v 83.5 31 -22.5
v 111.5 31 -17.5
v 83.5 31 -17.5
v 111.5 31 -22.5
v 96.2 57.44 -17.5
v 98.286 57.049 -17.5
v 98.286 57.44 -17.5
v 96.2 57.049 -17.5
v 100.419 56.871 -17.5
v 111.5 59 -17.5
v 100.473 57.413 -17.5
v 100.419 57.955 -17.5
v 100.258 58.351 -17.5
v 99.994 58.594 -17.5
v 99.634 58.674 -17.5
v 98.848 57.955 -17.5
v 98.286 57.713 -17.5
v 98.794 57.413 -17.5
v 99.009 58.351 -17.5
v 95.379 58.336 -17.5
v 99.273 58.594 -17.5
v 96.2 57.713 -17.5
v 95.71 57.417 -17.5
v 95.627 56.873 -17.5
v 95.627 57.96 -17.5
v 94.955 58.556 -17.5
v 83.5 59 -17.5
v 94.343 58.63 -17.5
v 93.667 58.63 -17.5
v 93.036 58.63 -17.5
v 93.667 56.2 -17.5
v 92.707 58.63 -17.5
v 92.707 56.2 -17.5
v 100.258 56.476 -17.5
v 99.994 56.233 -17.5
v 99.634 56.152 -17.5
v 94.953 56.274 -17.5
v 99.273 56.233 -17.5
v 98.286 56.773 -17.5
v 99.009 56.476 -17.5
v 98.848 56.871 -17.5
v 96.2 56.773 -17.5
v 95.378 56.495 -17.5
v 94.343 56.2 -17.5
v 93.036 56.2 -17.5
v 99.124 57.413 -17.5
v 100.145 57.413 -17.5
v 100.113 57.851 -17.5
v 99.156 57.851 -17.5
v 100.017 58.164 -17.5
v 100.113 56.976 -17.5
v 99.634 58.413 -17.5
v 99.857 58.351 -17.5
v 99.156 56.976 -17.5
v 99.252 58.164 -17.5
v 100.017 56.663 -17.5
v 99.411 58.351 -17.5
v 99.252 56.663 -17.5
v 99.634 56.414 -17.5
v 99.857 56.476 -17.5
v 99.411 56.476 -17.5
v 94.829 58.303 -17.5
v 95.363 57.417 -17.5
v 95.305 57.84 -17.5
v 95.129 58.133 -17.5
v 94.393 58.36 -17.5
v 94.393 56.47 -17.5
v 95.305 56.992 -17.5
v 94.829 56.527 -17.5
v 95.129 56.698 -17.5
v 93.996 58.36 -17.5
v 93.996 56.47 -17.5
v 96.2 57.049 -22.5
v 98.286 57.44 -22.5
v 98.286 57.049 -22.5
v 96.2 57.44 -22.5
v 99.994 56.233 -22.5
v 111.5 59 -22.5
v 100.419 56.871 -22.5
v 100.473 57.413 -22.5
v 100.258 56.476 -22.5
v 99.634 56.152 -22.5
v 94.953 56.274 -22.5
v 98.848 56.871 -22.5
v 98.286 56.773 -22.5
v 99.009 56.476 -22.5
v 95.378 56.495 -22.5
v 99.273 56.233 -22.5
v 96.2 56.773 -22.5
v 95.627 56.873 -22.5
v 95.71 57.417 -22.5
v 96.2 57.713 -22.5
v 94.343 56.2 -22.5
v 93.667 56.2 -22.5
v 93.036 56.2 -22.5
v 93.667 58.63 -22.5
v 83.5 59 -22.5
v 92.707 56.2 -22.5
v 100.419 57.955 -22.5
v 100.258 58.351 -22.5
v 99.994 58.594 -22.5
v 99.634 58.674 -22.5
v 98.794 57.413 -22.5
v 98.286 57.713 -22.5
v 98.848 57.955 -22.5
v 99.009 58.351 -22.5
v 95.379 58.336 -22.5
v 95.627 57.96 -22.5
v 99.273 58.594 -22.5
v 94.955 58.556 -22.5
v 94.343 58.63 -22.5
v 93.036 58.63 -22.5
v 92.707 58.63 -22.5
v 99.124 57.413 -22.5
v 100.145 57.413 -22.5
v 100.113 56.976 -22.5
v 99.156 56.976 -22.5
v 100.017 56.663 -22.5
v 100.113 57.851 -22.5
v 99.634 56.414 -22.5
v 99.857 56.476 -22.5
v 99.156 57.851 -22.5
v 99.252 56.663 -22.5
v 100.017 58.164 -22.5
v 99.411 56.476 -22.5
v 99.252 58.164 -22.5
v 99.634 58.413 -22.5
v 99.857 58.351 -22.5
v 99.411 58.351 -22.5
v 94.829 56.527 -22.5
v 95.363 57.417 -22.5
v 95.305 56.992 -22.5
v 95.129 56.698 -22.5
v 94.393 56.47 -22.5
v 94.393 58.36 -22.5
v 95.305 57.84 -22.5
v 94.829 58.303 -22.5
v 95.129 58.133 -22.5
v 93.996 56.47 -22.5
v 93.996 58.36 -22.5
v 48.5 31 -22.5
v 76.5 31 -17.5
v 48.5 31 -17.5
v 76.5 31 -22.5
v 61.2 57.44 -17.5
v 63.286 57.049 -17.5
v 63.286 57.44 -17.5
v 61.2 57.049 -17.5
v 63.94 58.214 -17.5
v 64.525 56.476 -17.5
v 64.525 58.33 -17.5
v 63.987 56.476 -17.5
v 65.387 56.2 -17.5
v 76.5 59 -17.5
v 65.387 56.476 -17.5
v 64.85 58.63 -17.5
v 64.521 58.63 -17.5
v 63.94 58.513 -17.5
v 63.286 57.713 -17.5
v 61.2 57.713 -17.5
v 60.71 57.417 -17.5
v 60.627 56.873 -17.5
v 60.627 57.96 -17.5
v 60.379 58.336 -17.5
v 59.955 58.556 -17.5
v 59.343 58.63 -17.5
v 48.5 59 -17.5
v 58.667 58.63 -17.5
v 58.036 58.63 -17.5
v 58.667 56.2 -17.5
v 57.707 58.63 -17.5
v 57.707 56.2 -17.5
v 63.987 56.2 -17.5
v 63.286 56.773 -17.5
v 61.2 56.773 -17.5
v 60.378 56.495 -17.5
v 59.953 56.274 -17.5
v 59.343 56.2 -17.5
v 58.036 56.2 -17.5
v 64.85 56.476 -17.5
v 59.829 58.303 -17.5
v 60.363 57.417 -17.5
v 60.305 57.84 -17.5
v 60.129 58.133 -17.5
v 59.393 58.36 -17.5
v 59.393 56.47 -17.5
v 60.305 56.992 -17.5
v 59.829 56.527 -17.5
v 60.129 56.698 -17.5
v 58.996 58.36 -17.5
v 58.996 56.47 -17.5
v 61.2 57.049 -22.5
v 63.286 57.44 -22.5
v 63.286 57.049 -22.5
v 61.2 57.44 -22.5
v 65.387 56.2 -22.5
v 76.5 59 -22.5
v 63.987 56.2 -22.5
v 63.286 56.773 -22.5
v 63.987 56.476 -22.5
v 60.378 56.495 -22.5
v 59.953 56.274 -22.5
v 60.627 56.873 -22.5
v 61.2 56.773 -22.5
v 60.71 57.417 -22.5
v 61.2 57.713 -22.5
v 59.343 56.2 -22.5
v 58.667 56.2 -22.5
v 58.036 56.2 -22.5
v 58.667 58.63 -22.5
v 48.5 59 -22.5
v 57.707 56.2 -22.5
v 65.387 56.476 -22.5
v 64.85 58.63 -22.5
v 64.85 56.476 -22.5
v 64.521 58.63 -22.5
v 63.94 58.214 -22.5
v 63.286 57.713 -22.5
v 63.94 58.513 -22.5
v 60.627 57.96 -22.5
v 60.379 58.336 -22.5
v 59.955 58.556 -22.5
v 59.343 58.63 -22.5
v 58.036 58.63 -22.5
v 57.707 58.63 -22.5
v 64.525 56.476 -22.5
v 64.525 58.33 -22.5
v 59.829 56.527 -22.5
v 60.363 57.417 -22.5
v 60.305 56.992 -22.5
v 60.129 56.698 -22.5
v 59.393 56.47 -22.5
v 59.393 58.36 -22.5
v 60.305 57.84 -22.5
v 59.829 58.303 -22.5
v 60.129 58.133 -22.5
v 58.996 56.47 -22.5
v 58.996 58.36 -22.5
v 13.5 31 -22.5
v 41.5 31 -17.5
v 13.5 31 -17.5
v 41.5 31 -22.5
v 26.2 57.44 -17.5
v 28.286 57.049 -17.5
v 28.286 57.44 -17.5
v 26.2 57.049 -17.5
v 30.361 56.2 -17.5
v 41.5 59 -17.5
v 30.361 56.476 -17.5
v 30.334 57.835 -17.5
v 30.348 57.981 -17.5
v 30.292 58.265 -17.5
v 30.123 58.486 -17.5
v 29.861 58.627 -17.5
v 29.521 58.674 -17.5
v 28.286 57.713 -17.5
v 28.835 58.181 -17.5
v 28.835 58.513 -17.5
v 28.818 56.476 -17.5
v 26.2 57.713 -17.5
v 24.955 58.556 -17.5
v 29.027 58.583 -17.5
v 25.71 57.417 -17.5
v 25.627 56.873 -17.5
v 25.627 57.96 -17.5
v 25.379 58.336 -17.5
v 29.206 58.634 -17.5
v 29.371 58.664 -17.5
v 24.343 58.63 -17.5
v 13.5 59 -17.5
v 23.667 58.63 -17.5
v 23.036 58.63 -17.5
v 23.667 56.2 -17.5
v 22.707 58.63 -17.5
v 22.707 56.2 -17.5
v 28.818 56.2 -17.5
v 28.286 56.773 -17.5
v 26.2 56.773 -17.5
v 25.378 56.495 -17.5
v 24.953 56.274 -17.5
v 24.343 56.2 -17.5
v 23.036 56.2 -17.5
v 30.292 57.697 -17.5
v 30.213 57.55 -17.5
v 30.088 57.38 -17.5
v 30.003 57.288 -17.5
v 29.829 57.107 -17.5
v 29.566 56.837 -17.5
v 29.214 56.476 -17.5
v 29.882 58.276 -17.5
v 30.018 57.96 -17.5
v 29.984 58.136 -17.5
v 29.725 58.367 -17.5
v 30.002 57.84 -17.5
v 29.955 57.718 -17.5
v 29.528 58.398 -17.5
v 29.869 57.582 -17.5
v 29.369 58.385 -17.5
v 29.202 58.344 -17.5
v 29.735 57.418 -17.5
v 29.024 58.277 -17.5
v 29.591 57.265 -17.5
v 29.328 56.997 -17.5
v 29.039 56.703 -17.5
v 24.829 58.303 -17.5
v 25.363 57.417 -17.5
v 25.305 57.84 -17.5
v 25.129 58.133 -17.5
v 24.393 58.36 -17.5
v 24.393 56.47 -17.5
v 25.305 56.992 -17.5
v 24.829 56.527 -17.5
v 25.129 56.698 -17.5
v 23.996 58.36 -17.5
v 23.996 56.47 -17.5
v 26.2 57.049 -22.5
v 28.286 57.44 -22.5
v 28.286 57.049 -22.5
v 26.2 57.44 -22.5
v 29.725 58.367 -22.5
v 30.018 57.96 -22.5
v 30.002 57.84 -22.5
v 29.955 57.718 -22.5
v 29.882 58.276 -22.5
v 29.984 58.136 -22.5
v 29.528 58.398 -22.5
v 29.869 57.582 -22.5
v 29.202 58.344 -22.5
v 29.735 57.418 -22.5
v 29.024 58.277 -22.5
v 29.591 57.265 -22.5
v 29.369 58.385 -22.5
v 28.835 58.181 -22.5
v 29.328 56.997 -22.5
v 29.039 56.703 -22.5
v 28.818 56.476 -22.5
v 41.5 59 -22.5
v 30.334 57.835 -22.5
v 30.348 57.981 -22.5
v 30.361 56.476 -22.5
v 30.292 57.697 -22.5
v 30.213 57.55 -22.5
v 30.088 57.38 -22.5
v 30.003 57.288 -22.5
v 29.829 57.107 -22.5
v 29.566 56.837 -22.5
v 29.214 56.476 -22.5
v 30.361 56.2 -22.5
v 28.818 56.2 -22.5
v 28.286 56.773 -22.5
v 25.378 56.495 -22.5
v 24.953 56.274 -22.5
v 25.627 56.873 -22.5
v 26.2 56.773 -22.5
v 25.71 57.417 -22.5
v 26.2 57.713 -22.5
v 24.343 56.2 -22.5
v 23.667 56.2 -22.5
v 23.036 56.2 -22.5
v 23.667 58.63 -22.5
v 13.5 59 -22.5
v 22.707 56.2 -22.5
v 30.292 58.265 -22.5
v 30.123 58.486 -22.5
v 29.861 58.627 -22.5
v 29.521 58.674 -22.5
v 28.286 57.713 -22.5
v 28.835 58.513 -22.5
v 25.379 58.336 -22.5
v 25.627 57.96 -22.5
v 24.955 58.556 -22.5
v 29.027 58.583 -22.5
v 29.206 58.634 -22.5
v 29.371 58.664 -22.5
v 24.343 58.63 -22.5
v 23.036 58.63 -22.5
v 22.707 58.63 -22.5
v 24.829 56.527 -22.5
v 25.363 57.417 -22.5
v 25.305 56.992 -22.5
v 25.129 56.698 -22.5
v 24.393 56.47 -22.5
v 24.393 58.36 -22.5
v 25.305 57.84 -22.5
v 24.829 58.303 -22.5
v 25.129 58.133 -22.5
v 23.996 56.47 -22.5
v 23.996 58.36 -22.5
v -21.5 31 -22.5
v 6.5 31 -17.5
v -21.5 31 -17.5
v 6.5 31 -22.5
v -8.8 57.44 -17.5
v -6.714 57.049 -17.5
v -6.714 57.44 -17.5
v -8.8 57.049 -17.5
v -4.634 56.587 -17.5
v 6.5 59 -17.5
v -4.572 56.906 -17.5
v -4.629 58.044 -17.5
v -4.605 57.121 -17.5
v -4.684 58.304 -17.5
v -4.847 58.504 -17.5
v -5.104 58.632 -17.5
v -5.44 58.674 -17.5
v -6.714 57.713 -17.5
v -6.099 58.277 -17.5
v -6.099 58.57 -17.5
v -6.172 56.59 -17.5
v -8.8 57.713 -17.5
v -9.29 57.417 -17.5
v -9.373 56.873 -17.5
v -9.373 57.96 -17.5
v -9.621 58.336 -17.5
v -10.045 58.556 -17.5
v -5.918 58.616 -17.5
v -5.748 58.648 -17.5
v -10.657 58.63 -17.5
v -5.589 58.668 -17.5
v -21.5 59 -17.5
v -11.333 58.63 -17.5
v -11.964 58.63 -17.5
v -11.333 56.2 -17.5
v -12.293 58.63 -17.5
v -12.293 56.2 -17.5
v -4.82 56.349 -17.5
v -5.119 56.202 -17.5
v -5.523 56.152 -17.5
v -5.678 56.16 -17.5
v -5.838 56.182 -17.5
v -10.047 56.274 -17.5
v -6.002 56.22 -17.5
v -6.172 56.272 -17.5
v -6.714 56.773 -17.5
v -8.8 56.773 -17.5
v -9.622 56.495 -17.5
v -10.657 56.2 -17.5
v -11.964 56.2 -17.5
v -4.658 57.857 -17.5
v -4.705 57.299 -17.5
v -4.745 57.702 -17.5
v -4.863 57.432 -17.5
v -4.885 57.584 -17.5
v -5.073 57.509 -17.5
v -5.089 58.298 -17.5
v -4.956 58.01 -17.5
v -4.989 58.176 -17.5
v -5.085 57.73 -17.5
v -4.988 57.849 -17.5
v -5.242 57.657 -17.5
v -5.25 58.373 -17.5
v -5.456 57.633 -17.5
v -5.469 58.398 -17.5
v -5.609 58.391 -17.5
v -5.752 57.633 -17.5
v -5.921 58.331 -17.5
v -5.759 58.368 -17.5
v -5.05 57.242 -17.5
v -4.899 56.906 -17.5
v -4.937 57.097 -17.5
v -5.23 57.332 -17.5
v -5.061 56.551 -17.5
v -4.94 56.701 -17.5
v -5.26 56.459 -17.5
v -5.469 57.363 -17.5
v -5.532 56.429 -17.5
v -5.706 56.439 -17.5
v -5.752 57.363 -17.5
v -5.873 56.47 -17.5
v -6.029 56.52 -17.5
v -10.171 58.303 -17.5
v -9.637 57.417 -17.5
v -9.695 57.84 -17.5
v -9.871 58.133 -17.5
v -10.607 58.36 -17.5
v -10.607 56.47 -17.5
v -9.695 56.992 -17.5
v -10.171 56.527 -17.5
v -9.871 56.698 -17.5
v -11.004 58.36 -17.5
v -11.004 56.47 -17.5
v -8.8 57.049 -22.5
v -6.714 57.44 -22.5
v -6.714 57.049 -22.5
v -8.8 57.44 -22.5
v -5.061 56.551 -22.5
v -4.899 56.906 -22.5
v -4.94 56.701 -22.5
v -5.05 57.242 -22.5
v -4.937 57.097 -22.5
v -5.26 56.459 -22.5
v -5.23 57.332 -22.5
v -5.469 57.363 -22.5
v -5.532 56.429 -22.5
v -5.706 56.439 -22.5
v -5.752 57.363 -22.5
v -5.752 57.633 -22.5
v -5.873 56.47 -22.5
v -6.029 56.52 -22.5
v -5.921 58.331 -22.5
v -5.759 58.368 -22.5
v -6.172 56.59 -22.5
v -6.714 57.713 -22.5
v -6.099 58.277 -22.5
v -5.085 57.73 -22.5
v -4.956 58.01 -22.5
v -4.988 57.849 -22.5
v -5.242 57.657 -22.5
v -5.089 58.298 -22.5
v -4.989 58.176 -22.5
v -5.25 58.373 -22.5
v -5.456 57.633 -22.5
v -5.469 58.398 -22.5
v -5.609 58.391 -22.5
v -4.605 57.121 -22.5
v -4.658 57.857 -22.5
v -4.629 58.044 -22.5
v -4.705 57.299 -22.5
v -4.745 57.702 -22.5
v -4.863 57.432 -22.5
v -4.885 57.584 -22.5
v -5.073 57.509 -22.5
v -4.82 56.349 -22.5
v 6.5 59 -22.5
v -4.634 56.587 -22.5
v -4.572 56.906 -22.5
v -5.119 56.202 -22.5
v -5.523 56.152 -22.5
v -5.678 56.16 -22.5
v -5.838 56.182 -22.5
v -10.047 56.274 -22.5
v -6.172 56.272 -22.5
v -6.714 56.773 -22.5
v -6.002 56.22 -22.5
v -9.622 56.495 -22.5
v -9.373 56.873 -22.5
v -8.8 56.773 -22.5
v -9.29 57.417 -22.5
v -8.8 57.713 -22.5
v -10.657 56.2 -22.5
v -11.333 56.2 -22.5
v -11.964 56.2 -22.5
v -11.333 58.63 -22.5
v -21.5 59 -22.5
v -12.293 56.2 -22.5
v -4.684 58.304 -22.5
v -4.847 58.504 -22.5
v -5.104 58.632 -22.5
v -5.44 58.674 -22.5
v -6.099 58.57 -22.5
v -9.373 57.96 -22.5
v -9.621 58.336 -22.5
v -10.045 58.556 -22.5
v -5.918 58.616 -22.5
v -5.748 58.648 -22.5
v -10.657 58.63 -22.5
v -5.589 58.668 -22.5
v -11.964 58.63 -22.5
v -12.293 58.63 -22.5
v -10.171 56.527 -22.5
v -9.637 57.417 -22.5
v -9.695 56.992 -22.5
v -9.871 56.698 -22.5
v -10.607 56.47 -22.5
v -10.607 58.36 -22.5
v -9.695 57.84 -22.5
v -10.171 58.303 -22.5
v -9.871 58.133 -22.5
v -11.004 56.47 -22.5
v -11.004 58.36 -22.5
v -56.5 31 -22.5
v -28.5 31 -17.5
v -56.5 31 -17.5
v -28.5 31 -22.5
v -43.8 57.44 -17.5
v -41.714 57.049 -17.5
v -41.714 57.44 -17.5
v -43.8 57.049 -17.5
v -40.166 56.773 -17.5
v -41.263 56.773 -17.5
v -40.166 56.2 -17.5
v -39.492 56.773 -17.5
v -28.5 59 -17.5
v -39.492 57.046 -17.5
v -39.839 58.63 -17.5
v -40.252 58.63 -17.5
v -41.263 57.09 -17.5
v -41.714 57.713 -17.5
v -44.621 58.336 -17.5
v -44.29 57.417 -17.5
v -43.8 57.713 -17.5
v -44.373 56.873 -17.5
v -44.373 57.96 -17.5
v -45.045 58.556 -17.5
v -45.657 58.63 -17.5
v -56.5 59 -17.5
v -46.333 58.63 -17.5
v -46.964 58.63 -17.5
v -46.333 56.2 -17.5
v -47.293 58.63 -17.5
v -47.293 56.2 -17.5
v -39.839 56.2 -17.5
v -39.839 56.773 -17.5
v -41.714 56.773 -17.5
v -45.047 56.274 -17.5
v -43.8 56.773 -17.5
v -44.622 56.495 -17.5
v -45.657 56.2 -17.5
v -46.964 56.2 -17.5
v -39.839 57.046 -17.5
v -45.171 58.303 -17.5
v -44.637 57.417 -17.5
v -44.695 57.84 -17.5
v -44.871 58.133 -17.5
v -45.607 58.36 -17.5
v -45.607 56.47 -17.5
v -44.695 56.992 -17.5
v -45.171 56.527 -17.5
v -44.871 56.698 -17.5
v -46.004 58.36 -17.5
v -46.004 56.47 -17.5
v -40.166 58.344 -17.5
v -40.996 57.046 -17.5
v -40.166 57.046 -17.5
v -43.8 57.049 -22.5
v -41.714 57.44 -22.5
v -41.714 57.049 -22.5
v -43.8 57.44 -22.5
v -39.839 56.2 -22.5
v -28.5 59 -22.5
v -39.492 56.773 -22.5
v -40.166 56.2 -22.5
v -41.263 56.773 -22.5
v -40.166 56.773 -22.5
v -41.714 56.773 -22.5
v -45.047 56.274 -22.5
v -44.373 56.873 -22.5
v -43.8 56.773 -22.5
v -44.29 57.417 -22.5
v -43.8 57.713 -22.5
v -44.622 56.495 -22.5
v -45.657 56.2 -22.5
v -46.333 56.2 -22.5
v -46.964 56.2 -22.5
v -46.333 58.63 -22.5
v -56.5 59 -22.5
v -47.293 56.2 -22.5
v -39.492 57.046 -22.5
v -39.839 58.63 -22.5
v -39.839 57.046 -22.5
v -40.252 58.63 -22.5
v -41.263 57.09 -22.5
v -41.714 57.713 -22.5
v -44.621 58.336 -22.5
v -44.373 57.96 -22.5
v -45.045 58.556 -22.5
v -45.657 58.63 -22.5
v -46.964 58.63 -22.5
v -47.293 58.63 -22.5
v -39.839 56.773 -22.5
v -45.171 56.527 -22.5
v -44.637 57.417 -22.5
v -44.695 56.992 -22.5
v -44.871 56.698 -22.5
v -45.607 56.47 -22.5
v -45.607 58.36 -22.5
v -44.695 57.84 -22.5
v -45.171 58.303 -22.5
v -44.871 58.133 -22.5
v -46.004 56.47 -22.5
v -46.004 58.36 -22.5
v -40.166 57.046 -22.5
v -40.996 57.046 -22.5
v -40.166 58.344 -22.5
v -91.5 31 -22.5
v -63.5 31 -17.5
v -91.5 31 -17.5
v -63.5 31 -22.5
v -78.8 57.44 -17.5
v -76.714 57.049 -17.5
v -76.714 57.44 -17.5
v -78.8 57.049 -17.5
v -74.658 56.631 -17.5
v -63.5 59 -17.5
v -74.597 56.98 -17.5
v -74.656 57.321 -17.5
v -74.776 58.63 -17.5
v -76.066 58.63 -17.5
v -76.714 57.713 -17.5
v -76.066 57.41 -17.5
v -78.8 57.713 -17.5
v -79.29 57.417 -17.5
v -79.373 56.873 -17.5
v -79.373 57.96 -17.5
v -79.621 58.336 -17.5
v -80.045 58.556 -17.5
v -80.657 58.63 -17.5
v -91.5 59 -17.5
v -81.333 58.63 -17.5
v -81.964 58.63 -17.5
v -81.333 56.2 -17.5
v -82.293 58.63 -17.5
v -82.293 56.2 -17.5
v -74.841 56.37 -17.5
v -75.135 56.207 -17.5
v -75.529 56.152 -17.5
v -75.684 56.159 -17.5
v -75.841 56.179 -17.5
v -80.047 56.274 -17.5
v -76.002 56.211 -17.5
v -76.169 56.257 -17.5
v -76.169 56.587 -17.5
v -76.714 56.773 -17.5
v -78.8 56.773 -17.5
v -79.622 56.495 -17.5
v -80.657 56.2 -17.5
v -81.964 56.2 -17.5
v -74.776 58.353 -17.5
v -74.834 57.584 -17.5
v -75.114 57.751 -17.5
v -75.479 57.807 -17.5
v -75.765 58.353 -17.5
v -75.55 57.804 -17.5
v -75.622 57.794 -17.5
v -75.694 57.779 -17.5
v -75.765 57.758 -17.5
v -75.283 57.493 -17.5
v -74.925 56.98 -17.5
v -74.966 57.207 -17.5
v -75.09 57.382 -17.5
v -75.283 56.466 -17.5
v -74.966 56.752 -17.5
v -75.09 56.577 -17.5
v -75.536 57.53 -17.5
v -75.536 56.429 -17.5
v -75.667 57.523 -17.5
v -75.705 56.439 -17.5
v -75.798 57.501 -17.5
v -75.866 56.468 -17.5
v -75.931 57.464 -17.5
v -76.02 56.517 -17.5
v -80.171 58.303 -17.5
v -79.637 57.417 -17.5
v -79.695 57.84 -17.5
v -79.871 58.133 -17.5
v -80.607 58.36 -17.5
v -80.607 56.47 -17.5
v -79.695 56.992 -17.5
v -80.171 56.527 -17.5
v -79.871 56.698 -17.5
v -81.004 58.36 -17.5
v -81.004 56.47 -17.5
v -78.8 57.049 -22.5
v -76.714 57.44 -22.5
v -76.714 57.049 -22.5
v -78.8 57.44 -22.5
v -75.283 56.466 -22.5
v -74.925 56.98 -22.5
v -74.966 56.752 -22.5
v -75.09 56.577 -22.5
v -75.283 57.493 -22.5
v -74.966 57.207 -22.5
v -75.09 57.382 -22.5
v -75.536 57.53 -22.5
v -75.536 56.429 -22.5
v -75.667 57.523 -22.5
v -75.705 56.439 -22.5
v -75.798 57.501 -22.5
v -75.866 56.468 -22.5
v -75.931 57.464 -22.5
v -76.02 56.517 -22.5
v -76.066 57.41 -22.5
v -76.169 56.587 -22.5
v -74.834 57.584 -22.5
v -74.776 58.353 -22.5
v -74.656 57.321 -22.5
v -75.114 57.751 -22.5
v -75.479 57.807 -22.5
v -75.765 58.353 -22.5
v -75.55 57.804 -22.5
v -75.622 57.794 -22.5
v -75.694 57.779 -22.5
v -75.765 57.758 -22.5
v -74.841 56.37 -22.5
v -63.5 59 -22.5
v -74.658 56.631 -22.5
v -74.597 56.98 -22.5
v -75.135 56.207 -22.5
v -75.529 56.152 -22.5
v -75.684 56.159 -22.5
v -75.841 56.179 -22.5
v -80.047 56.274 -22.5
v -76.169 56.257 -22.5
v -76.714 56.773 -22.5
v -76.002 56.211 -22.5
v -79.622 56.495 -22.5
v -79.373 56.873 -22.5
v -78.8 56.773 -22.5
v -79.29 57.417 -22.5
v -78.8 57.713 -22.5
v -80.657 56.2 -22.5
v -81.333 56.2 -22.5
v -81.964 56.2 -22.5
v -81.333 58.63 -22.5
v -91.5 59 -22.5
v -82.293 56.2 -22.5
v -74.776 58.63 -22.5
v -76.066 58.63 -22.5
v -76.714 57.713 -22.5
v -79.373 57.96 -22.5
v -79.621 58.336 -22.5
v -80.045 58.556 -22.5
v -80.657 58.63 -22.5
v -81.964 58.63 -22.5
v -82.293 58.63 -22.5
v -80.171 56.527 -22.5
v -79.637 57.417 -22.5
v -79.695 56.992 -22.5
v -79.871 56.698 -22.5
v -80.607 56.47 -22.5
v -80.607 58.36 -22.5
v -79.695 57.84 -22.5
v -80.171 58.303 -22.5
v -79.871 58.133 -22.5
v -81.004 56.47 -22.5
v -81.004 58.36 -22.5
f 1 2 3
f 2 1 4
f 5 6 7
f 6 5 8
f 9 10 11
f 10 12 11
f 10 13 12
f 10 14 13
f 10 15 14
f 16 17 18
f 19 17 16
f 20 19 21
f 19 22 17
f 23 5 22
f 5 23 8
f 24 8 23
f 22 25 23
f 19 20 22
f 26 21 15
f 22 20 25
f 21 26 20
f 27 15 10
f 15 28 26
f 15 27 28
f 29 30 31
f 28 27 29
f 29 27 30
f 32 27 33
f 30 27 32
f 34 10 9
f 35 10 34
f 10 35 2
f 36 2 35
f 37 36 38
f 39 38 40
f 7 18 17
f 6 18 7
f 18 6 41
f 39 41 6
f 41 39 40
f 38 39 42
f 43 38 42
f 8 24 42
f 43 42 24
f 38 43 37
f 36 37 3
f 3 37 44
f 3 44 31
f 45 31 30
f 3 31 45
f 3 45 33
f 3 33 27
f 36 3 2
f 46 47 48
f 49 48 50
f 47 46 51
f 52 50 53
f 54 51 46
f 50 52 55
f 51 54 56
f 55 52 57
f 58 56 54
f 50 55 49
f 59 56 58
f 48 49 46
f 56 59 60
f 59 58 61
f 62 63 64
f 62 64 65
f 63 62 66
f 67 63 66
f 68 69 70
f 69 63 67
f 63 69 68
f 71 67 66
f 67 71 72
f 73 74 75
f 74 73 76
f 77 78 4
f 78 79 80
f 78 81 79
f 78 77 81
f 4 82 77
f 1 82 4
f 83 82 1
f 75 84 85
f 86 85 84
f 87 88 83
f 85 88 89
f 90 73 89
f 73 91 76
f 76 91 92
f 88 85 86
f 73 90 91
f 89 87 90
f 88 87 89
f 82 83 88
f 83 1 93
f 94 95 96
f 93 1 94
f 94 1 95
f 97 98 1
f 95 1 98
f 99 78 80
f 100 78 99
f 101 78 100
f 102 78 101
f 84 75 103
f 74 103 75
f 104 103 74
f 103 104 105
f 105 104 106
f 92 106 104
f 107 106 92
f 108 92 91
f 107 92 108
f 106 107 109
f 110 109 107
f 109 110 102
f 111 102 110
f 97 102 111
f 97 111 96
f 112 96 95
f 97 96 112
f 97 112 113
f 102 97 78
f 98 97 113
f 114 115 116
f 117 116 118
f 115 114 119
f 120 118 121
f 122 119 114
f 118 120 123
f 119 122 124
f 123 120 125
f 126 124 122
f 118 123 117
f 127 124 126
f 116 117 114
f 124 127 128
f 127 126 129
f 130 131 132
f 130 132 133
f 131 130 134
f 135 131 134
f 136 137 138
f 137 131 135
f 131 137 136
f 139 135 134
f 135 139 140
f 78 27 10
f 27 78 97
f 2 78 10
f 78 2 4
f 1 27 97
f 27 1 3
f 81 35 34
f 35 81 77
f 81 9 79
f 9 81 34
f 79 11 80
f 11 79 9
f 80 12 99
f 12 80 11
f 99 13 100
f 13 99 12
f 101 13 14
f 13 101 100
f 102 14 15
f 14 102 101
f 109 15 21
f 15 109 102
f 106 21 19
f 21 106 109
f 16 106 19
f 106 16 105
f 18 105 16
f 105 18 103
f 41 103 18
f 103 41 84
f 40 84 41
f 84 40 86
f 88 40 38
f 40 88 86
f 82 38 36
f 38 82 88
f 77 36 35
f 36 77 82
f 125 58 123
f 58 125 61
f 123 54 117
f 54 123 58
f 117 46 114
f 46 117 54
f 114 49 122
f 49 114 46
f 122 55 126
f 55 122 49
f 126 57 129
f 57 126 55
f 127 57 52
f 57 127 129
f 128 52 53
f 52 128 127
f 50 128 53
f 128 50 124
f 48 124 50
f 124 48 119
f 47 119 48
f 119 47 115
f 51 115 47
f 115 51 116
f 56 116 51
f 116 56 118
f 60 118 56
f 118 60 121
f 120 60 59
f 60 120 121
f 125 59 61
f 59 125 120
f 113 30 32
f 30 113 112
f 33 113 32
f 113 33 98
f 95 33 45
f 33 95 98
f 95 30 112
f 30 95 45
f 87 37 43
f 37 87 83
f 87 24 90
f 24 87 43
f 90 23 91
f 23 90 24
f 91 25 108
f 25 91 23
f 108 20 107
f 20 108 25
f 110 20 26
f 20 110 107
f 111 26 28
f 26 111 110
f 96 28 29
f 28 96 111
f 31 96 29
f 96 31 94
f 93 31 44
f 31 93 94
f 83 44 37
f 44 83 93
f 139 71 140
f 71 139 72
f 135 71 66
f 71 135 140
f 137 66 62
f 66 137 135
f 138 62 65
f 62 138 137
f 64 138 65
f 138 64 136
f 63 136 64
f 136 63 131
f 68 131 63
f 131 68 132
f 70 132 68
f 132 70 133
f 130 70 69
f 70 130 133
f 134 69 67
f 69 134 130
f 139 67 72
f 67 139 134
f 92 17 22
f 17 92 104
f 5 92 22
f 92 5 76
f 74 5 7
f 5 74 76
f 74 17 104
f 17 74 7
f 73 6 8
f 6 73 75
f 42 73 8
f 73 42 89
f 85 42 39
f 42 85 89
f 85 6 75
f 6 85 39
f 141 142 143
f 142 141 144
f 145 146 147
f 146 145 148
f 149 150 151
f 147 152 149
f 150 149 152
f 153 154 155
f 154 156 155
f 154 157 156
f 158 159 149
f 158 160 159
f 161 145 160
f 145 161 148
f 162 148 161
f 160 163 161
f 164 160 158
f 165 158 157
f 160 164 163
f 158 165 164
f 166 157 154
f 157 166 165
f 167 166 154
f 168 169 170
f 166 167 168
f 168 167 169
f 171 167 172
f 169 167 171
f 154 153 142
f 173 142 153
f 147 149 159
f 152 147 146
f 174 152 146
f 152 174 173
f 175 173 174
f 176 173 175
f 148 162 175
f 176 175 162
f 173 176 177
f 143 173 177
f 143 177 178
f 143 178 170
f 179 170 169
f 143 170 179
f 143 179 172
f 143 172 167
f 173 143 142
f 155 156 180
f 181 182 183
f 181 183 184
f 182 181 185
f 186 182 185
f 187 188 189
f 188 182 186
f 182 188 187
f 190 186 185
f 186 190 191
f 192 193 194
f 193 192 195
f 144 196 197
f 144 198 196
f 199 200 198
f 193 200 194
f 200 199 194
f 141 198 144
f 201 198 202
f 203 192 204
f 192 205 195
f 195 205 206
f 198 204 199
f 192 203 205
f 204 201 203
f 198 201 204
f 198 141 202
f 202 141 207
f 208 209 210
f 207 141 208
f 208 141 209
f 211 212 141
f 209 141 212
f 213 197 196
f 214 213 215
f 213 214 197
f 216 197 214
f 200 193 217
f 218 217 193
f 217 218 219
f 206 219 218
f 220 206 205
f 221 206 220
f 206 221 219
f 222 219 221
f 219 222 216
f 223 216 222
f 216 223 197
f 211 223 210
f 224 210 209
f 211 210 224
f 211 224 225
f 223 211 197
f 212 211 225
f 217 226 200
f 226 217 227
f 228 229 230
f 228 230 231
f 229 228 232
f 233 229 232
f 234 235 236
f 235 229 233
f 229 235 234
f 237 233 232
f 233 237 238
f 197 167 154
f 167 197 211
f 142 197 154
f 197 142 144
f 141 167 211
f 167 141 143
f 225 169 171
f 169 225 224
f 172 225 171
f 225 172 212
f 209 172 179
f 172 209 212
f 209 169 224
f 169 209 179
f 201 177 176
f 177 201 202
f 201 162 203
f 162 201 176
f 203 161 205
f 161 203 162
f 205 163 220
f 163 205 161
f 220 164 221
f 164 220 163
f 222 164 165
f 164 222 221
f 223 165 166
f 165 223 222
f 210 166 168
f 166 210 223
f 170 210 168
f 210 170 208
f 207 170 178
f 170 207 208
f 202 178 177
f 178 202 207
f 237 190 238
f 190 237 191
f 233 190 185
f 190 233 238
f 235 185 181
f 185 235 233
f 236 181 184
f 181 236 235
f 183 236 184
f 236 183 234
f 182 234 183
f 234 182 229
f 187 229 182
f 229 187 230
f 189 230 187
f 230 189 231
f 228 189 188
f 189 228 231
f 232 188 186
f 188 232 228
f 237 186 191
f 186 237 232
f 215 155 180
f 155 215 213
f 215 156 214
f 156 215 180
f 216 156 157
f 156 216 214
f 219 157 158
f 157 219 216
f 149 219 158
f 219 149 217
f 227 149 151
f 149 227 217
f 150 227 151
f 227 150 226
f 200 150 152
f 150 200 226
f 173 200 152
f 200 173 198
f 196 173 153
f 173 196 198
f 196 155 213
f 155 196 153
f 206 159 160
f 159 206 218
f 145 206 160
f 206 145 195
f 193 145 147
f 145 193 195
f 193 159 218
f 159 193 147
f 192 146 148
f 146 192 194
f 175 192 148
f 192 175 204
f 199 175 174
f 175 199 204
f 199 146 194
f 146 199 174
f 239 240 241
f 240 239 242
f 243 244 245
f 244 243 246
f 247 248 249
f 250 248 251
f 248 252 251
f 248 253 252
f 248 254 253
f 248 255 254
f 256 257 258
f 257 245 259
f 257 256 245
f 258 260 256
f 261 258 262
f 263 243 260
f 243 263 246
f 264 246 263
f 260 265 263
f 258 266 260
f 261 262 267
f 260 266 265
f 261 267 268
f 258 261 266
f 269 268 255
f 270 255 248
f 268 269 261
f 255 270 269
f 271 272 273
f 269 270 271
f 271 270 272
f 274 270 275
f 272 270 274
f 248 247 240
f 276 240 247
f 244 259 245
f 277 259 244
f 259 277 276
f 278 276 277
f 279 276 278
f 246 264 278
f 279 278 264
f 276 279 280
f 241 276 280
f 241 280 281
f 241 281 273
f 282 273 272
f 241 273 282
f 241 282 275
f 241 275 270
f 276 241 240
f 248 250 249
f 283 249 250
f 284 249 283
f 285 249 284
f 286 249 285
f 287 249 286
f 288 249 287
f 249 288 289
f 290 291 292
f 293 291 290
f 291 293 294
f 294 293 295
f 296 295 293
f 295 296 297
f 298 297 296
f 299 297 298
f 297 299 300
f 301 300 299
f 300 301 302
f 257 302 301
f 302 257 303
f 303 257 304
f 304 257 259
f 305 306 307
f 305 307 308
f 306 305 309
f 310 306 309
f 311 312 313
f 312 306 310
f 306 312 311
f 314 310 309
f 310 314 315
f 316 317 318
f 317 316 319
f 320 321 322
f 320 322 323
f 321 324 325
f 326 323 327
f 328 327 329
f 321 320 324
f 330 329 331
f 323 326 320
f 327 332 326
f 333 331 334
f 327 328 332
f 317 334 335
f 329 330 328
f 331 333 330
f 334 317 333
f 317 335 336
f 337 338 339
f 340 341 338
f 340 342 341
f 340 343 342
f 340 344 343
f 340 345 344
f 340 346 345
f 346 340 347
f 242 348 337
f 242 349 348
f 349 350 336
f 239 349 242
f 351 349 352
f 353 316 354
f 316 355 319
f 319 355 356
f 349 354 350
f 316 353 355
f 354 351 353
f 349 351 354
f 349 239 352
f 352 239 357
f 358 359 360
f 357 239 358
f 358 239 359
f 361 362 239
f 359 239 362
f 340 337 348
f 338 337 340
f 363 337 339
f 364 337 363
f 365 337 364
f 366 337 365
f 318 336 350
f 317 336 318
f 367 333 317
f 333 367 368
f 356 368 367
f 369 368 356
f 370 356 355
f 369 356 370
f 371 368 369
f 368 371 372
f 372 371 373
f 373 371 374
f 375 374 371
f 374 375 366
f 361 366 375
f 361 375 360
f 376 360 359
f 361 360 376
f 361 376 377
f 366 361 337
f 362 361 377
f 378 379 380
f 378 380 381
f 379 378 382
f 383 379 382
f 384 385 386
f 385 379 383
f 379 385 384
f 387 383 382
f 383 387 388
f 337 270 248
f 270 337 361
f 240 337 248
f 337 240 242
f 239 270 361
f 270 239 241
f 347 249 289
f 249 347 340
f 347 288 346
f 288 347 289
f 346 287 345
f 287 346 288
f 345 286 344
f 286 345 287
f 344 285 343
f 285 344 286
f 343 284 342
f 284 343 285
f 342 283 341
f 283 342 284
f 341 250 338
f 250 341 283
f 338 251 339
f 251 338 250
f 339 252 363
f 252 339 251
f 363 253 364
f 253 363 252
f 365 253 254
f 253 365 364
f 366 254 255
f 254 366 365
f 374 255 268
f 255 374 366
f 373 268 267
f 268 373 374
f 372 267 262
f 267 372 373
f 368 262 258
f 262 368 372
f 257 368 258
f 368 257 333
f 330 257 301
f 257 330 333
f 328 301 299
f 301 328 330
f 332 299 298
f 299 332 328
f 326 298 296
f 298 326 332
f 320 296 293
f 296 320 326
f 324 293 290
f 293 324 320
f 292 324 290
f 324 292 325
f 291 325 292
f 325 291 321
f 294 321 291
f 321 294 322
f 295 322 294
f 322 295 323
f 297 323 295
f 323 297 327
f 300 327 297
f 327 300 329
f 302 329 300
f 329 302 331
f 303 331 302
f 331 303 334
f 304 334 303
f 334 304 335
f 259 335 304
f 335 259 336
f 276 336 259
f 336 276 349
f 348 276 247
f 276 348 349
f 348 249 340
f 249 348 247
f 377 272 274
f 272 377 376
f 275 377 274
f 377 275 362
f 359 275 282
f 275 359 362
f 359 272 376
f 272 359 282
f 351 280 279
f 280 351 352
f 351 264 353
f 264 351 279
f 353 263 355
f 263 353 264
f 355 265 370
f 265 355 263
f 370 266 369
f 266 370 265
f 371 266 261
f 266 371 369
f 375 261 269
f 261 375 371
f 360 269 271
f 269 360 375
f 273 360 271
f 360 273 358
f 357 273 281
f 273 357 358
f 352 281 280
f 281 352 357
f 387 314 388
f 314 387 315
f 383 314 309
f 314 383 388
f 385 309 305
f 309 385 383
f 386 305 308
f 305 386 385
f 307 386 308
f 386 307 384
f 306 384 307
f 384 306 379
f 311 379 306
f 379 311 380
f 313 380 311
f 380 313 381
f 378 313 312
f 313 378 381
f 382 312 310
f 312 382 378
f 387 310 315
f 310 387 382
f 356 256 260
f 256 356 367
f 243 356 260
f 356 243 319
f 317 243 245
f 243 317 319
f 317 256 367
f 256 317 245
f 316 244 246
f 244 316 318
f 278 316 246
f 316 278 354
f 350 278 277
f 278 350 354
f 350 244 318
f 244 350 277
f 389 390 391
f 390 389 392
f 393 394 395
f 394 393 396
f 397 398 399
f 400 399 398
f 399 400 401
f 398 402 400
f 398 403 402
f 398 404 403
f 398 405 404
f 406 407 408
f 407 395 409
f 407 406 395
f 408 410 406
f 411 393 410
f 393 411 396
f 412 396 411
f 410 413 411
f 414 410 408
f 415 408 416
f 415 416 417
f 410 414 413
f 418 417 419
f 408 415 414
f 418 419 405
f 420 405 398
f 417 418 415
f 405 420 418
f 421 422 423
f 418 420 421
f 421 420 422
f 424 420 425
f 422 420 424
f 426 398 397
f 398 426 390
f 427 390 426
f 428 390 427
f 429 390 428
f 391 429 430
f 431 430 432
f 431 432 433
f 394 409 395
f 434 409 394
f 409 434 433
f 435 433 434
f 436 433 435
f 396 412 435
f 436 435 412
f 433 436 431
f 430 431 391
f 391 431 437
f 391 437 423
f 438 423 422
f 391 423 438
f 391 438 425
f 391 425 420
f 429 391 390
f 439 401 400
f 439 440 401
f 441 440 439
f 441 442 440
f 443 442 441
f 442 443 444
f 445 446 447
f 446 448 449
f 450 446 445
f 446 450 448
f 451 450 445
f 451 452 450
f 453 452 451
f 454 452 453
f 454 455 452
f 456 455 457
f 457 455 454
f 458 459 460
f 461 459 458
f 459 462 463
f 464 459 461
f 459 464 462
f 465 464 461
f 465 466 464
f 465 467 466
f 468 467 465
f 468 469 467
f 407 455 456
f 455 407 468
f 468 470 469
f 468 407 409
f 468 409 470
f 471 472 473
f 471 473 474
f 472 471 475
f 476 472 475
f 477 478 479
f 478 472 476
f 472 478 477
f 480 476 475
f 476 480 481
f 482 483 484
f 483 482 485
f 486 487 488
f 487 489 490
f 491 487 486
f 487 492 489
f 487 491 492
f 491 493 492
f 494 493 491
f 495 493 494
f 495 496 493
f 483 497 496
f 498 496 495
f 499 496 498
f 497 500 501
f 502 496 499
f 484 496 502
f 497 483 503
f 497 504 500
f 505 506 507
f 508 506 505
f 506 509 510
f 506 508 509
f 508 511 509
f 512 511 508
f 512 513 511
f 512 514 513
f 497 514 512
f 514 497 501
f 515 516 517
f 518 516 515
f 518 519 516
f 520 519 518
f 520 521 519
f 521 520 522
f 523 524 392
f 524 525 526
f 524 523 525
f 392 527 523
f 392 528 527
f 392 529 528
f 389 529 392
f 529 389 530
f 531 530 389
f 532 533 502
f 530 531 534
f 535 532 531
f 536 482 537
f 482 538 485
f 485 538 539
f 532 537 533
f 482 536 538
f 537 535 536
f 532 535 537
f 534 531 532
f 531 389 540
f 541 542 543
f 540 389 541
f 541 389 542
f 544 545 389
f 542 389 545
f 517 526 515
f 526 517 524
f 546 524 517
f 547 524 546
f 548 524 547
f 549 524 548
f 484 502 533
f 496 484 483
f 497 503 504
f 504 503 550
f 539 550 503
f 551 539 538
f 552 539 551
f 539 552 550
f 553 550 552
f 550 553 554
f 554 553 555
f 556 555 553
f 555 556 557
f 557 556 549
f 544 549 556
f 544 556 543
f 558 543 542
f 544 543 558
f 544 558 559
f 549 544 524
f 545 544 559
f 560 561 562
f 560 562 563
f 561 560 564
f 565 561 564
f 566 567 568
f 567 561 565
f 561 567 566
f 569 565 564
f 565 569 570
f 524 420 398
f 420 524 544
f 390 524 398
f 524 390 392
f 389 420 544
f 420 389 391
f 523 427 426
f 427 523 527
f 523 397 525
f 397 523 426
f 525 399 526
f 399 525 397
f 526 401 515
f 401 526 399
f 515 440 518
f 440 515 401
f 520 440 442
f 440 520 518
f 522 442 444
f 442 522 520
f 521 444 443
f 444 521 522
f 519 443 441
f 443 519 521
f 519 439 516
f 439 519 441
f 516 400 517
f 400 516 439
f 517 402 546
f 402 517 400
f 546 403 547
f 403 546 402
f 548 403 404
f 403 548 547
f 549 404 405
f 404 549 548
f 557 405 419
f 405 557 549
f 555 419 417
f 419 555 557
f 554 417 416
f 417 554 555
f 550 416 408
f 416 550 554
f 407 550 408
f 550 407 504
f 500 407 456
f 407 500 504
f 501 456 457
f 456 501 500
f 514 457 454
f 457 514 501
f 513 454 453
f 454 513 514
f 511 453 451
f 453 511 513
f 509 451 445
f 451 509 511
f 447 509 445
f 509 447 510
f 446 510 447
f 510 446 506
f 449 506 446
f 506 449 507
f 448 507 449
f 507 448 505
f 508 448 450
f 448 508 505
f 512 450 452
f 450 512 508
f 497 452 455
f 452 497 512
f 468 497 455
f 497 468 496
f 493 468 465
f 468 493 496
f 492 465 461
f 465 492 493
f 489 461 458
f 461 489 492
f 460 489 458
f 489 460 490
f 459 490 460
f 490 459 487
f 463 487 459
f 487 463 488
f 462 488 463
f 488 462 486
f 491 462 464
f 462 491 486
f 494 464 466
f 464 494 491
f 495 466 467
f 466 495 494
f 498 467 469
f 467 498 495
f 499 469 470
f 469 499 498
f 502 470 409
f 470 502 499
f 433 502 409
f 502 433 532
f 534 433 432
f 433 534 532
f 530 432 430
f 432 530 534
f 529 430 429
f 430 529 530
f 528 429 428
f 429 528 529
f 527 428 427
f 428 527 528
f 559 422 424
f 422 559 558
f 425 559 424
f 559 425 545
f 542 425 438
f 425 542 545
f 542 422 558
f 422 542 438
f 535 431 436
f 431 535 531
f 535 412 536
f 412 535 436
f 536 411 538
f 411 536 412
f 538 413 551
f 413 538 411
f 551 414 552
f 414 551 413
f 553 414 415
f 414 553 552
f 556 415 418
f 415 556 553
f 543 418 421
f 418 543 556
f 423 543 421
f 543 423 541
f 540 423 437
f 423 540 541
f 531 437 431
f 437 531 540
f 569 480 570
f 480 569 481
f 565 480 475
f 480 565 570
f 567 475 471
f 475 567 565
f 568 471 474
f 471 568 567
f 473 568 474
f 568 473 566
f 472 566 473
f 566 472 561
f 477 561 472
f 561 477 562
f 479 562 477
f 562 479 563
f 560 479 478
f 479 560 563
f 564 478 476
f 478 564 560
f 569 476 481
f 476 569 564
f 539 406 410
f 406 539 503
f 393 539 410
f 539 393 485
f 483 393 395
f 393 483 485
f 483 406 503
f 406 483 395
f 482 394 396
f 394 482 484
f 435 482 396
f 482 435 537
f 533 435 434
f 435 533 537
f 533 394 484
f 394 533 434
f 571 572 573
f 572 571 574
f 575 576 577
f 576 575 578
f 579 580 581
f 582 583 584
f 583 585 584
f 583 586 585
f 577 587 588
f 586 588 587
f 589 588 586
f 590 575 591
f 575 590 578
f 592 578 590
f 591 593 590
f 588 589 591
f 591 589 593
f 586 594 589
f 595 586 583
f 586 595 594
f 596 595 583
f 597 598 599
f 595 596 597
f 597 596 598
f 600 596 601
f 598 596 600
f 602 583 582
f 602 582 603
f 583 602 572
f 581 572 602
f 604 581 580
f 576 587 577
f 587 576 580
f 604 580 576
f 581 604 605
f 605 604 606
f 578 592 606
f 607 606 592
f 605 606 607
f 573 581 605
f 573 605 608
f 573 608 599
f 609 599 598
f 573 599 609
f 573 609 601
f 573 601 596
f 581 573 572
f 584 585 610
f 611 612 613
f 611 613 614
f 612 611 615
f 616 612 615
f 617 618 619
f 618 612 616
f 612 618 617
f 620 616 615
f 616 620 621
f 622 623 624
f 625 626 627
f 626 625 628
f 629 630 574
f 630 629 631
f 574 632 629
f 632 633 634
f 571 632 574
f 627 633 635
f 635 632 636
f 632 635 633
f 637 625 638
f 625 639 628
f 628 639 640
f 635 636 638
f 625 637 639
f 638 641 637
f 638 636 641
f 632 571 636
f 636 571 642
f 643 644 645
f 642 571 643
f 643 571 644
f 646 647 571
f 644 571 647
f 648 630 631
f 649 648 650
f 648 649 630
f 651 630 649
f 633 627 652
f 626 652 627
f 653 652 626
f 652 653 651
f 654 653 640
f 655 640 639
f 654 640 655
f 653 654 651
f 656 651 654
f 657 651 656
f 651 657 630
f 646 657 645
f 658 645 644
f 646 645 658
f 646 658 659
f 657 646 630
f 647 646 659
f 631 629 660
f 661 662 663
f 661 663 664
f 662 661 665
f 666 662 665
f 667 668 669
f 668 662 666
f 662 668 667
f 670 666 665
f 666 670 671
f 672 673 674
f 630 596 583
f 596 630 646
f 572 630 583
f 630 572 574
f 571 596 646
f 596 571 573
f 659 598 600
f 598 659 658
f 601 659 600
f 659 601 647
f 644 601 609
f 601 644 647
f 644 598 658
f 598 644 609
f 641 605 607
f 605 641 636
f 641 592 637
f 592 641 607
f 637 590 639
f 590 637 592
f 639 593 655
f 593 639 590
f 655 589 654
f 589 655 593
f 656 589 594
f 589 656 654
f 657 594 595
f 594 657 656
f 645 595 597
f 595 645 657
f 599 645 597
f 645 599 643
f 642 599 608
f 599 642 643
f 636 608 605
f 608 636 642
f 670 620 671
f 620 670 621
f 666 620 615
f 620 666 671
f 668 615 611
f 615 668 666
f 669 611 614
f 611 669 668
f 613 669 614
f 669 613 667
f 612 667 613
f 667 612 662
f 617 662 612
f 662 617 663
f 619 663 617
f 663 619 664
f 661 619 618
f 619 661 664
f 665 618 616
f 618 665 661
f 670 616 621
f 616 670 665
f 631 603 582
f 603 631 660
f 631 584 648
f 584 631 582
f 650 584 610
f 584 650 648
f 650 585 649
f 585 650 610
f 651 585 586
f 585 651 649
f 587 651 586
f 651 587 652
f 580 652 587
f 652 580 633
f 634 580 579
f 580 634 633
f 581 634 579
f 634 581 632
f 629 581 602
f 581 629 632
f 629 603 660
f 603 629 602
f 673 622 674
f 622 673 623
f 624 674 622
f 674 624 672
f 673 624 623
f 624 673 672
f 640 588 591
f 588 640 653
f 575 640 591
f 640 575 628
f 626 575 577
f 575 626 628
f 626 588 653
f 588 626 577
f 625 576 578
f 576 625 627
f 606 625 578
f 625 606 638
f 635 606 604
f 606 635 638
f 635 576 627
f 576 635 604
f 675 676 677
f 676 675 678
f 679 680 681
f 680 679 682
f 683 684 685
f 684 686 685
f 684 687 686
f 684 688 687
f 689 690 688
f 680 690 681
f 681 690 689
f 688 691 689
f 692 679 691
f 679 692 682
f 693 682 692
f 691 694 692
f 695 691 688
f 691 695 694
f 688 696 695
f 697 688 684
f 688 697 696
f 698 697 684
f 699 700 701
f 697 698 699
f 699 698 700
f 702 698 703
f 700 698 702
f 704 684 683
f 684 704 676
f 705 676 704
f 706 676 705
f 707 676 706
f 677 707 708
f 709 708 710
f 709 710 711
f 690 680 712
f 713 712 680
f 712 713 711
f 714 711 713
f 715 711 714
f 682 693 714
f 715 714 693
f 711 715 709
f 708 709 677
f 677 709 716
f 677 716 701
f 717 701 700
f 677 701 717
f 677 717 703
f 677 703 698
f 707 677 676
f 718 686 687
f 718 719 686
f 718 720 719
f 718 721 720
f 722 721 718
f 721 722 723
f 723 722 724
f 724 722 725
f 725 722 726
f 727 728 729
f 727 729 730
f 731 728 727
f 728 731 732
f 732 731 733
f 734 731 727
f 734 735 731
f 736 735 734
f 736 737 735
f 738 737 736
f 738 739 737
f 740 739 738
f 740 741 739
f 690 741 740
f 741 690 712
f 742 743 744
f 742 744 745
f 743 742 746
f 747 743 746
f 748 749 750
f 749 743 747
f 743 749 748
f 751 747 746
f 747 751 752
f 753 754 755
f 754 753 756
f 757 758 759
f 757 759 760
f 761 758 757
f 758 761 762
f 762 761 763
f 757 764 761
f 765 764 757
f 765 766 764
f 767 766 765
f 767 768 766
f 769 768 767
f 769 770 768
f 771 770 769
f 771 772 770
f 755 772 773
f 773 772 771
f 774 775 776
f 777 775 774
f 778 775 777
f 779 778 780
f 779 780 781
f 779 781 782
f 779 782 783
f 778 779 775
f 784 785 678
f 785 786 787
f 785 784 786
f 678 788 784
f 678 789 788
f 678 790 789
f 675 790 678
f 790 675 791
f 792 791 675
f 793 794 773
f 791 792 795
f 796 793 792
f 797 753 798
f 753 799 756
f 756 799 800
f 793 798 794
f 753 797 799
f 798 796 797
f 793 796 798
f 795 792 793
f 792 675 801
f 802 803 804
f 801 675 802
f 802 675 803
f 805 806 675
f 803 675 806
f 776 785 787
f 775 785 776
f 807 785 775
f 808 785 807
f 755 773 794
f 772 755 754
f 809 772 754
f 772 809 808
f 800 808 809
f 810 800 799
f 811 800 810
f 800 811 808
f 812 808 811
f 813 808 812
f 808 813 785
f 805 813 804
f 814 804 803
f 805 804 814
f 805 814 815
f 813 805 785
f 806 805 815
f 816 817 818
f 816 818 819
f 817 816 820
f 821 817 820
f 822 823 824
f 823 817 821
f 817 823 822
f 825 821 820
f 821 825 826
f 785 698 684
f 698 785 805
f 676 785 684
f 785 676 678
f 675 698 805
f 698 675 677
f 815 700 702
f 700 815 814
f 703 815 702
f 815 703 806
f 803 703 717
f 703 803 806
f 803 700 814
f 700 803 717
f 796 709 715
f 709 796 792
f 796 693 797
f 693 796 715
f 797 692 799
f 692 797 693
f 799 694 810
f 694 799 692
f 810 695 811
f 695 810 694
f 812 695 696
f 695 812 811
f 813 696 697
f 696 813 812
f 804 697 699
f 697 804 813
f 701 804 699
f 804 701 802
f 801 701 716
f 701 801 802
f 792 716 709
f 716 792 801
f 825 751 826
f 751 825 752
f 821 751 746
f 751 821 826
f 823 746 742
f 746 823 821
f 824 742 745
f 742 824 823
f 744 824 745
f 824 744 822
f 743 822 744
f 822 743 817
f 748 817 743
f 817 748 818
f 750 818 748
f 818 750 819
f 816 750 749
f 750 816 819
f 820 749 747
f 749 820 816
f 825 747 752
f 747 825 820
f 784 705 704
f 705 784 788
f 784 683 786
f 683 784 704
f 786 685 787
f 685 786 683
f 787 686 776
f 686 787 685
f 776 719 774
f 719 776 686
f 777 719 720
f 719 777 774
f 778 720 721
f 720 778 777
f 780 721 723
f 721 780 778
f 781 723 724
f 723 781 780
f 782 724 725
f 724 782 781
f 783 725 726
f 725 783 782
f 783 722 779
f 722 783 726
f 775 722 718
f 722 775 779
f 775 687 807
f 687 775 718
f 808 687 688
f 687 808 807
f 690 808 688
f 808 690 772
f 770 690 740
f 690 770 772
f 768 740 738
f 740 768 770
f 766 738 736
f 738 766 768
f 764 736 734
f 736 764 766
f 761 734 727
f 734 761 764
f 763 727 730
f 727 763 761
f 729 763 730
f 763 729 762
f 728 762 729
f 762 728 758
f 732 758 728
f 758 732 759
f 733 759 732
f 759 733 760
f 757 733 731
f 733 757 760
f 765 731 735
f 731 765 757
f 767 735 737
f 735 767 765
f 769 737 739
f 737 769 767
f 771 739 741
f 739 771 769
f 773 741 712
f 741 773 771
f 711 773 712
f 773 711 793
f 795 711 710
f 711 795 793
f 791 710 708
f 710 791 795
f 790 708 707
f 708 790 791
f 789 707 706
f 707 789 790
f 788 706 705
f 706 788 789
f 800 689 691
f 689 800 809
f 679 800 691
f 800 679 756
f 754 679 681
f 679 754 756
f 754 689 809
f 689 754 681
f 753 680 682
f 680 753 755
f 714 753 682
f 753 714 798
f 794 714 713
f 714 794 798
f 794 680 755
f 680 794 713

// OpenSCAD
// file: modules.scad
offset = [0,8,0];
zoom = [0.8,0.8,1];

module white( filename, text)
{
    translate(offset+[0,-4,0])   scale(zoom)
    rotate([180,0,-90]) 
    union(){ 
        translate([-14,-6.4,-2.5])   rotate([0,0,90])  linear_extrude(5)  text (text,font="bold",size=3); 
        intersection() 
        {    
            cube([35,35,5],center=true); 
            translate([1.5,0,2.6])   linear_extrude(5) scale([0.14,0.14,-1])surface(file = filename, center = true); 
        } 
    } 

};

module black( filename, text)
{
    translate(offset+[0,-4,0])   scale(zoom)
    rotate([180,0,-90]) 
    difference() 
    {    
        cube([35,35,5],center=true); 
        translate([1.5,0,2.6])    scale([0.14,0.14,-1]) surface(file = filename, center = true);
        translate([-14,-6.4,-2.5])   rotate([0,0,90])  linear_extrude(6)  text (text,font="bold",size=3);
    } 
}

module shape()
{
    translate(offset)   scale(zoom) rotate([180,0,0]) 
    {
        rotate([0,0,90]) translate([5,0,0])  cube([35,35,5.5],center=true);  
        linear_extrude(5)  translate([-9,-4,0])   text("B",size=20);
    }
    
}
// main file
include <modules.scad>

offset = 35;
bord = 97.5;


union() color([0,1,0])
{
    translate([bord,45,-20])          rotate([0,180,0]) black("../aruco/Marker0.png","ID=0");    
    translate([bord-offset,45,-20])   rotate([0,180,0]) black("../aruco/Marker1.png","ID=1");    
    translate([bord-2*offset,45,-20]) rotate([0,180,0]) black("../aruco/Marker2.png","ID=2");    
    translate([bord-3*offset,45,-20]) rotate([0,180,0]) black("../aruco/Marker3.png","ID=3");    
    translate([bord-4*offset,45,-20]) rotate([0,180,0]) black("../aruco/Marker4.png","ID=4");    
    translate([bord-5*offset,45,-20]) rotate([0,180,0]) black("../aruco/Marker5.png","ID=5");    
}
